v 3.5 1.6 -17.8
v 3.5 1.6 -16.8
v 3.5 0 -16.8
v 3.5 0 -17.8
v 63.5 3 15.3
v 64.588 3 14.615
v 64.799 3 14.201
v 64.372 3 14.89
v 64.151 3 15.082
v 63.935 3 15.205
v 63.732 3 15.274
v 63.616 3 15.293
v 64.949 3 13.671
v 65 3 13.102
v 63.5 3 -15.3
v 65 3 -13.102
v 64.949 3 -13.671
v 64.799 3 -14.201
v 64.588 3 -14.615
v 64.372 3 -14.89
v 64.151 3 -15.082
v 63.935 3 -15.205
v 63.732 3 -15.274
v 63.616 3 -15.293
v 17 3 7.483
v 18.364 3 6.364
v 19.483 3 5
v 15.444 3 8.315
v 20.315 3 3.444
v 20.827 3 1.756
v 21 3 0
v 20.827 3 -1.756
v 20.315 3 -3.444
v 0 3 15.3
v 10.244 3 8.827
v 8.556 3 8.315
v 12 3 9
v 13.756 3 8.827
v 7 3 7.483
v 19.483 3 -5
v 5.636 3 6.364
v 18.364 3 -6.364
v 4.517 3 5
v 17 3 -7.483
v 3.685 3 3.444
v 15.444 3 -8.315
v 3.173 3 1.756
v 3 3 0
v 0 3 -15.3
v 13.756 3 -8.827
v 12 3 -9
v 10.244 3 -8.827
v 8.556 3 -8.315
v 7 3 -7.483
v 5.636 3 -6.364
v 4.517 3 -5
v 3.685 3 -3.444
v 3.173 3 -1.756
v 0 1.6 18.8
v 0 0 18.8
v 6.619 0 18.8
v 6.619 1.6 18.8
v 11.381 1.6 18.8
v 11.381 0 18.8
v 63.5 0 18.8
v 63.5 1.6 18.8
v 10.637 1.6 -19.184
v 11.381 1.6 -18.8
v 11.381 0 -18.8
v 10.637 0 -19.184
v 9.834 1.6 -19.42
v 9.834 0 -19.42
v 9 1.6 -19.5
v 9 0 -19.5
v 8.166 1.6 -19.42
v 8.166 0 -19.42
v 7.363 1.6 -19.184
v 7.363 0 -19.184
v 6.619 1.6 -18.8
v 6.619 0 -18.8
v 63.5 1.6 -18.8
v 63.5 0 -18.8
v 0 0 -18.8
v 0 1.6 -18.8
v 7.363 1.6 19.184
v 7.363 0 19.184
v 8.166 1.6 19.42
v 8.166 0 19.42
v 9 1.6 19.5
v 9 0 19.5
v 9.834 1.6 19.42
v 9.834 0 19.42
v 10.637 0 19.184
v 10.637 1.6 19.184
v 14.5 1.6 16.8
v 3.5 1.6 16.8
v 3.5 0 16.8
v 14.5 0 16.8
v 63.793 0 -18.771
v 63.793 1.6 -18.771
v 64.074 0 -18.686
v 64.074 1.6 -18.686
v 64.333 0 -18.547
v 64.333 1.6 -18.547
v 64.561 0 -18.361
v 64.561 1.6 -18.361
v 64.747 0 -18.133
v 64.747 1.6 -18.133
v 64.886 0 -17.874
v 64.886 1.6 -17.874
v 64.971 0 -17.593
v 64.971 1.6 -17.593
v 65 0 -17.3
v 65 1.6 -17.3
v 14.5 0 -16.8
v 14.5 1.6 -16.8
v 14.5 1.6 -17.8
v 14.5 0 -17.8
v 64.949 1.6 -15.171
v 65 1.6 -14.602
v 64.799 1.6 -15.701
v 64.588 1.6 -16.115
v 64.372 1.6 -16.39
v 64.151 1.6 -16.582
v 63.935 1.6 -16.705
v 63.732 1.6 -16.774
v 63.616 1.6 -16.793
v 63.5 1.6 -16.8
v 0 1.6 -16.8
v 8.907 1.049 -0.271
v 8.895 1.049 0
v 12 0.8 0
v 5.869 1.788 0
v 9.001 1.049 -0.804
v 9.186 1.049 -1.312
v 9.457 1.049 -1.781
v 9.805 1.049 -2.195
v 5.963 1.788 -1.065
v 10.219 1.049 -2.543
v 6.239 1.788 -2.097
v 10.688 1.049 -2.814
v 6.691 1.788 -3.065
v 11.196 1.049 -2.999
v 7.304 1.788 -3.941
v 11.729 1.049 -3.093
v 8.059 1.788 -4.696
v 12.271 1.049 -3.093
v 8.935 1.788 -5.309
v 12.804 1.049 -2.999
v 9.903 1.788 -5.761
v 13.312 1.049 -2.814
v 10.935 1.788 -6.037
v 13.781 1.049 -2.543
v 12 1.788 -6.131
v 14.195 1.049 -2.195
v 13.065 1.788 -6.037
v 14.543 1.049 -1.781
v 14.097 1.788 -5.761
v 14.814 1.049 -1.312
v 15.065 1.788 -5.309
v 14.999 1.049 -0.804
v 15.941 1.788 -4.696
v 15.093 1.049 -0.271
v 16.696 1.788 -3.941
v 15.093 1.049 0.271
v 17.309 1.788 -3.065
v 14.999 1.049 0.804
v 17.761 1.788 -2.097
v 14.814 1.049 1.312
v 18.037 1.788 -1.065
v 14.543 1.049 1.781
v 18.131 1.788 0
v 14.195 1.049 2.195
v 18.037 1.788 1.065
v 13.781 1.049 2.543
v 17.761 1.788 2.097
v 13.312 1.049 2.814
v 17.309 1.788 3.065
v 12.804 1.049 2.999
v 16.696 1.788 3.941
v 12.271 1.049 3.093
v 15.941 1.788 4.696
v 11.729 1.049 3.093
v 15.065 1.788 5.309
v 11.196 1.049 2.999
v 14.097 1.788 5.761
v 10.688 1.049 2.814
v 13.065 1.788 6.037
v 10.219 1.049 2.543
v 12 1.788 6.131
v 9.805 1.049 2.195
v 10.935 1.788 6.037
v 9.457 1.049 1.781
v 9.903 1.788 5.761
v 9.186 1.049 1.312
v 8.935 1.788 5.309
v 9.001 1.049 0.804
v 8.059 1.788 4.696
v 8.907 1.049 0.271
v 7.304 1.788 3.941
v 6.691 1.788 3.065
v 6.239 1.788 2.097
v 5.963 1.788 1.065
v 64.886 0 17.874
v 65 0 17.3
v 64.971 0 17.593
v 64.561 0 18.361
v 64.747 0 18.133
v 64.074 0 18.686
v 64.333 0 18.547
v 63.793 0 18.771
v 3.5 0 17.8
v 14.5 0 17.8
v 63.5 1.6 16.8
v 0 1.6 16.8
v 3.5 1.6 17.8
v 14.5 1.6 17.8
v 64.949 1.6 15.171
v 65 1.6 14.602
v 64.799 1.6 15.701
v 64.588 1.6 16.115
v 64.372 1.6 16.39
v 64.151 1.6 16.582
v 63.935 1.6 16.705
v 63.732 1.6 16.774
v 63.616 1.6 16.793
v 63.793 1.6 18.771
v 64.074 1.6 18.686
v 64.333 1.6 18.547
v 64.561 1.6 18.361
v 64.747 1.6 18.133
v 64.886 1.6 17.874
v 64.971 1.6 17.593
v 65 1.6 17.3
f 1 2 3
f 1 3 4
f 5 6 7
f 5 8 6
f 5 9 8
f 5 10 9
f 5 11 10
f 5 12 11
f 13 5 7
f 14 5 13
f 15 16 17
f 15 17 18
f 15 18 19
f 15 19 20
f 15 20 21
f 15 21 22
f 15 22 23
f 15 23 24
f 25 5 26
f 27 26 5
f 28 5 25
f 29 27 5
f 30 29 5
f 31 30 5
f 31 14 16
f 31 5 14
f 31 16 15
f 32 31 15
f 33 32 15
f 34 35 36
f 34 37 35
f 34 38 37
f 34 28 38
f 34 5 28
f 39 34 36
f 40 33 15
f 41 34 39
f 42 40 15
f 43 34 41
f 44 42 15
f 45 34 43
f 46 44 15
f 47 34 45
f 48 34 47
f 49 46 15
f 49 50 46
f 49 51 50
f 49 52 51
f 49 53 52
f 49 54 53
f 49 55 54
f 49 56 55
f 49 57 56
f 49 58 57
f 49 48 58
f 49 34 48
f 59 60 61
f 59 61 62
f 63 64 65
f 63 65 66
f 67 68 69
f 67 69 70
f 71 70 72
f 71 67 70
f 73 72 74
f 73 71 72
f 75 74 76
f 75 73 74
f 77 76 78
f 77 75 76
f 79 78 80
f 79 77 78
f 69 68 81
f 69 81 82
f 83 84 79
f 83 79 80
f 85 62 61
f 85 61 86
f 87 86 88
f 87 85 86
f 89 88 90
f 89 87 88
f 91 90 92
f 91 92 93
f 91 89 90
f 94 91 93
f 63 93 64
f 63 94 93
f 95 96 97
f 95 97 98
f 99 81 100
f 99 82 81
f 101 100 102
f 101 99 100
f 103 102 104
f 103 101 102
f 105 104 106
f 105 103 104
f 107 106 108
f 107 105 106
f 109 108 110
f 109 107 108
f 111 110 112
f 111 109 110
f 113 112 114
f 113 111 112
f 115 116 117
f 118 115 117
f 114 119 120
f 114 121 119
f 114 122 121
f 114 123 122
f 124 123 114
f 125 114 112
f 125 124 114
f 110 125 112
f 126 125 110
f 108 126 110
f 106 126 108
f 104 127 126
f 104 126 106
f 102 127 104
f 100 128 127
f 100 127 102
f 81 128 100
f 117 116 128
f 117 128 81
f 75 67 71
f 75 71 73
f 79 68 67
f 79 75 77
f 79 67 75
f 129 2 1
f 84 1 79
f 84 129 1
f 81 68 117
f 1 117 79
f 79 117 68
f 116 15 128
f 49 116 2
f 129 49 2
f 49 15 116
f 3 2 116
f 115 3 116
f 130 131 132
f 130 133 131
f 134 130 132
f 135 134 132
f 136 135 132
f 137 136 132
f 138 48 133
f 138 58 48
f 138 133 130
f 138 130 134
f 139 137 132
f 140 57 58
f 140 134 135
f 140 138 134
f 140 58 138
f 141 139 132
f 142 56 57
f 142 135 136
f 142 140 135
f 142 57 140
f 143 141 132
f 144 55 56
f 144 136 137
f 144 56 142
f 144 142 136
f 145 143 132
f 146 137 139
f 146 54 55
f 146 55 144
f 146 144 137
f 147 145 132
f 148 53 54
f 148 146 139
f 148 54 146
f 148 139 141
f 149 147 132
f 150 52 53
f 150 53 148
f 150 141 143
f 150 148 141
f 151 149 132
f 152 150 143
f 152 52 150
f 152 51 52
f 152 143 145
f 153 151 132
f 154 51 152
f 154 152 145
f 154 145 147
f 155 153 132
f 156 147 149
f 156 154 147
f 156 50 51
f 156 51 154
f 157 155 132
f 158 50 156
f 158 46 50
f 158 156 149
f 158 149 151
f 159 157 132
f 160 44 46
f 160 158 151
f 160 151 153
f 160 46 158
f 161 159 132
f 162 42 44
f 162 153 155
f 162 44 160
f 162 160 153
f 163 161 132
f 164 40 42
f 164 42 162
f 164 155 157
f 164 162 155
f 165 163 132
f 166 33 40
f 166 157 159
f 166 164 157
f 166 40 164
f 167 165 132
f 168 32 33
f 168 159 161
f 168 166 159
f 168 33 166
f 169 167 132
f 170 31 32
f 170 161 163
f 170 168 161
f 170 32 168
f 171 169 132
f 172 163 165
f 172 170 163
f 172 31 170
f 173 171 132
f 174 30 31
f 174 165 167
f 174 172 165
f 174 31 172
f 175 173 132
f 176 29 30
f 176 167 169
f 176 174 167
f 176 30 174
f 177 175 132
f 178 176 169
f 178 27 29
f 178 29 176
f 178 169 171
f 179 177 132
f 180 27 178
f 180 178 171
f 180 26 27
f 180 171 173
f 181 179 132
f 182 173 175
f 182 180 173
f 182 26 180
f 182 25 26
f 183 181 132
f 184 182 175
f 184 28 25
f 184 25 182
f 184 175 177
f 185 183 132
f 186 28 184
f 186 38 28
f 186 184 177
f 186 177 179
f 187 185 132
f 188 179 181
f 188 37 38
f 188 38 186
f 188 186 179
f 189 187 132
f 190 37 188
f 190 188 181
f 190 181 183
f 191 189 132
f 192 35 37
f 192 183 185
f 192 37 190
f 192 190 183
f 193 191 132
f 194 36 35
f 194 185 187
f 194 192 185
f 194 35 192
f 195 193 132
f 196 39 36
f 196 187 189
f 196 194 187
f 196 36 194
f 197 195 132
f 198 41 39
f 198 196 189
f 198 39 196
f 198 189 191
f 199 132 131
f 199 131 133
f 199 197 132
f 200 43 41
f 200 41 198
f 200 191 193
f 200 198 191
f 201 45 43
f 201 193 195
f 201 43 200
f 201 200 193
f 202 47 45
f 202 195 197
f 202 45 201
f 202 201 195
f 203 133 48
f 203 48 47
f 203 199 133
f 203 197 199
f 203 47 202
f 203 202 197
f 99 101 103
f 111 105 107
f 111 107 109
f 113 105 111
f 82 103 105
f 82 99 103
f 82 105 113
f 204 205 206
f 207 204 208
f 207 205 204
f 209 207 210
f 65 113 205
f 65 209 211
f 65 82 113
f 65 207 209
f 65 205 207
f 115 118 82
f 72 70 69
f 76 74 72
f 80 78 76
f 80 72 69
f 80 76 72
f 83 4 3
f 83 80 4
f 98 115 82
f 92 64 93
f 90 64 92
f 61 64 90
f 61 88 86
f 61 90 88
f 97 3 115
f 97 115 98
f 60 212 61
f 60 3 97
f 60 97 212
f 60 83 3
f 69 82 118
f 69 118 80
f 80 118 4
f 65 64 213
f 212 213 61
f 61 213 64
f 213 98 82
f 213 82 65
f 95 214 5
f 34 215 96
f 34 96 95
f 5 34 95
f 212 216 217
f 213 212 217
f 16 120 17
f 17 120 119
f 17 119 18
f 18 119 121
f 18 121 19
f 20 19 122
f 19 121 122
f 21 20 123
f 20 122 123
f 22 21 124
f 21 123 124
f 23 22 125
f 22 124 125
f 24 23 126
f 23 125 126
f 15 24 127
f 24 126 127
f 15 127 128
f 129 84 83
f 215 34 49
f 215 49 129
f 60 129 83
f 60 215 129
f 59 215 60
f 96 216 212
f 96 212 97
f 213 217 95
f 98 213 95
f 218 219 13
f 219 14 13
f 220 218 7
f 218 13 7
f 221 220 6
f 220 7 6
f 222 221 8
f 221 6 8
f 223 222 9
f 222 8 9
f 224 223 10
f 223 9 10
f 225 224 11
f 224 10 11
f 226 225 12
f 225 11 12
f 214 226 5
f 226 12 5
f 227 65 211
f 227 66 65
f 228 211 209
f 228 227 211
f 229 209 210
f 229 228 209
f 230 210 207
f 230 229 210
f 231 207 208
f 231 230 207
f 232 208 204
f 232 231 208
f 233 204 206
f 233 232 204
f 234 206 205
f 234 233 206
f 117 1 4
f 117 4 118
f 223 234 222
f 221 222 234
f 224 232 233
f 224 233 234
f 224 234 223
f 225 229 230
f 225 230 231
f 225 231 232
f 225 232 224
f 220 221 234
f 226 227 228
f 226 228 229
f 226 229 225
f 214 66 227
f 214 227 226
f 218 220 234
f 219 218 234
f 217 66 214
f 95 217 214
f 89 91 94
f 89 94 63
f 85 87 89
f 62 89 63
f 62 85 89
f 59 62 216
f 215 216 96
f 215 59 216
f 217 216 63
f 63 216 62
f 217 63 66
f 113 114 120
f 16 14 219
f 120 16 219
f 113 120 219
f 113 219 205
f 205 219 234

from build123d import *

# Parameters (mm, degrees)
BOSS_EXTRUDE1_DEPTH      = 65
SKETCH2_R                = 4.4
BOSS_EXTRUDE_LATCH_DEPTH = 1.6
SKETCH3_W                = 11
SKETCH3_H                = 1
CUT_EXTRUDE1_DEPTH       = 68.880851497
FILLET1_R                = 1.5


with BuildPart() as part:
    # Sketch1 → Boss-Extrude1 (new body)
    with BuildSketch(Plane(origin=(0, 0, 0), x_dir=(0, 0, -1), z_dir=(1, 0, 0))):
        Polygon((18.8, 0), (-18.8, 0), (-18.8, 1.6), (-16.8, 1.6), (-15.3, 3), (15.3, 3), (16.8, 1.6), (18.8, 1.6), align=None)
    extrude(amount=BOSS_EXTRUDE1_DEPTH)

    # Sketch2 → Boss-Extrude-Latch (add)
    with BuildSketch(Plane(origin=(0, 1.6, 0), x_dir=(1, 0, 0), z_dir=(0, 1, 0))):
        with Locations((9, 15.1)):
            Circle(SKETCH2_R)
        with Locations((9, -15.1)):
            Circle(SKETCH2_R)
    extrude(amount=-BOSS_EXTRUDE_LATCH_DEPTH)

    # Sketch3 → Cut-Extrude1 (cut, through all)
    with BuildSketch(Plane(origin=(0, 1.6, 0), x_dir=(1, 0, 0), z_dir=(0, 1, 0))):
        with Locations((9, 17.3)):
            Rectangle(SKETCH3_W, SKETCH3_H)
        with Locations((9, -17.3)):
            Rectangle(SKETCH3_W, SKETCH3_H)
    extrude(amount=-CUT_EXTRUDE1_DEPTH, mode=Mode.SUBTRACT)

    # Sketch4 → Cut-Revolve1 (revolve, cut)
    with BuildSketch(Plane.XY):
        with BuildLine():
            Line((12, 39.818181818), (12, 0.8))
            ThreePointArc((12, 0.8), (-7.509090909, 20.309090909), (12, 39.818181818))
        make_face()
    revolve(axis=Axis((12, 39.818181818, 0), (0, -1, 0)), mode=Mode.SUBTRACT)

    # Fillet1
    fillet1_edges = [part.edges().sort_by_distance(p)[0] for p in [
        (65, 0.8, -18.8),
        (65, 2.3, -16.05),
        (65, 2.3, 16.05),
        (65, 0.8, 18.8),
    ]]
    fillet(fillet1_edges, radius=FILLET1_R)


solid = part.part
